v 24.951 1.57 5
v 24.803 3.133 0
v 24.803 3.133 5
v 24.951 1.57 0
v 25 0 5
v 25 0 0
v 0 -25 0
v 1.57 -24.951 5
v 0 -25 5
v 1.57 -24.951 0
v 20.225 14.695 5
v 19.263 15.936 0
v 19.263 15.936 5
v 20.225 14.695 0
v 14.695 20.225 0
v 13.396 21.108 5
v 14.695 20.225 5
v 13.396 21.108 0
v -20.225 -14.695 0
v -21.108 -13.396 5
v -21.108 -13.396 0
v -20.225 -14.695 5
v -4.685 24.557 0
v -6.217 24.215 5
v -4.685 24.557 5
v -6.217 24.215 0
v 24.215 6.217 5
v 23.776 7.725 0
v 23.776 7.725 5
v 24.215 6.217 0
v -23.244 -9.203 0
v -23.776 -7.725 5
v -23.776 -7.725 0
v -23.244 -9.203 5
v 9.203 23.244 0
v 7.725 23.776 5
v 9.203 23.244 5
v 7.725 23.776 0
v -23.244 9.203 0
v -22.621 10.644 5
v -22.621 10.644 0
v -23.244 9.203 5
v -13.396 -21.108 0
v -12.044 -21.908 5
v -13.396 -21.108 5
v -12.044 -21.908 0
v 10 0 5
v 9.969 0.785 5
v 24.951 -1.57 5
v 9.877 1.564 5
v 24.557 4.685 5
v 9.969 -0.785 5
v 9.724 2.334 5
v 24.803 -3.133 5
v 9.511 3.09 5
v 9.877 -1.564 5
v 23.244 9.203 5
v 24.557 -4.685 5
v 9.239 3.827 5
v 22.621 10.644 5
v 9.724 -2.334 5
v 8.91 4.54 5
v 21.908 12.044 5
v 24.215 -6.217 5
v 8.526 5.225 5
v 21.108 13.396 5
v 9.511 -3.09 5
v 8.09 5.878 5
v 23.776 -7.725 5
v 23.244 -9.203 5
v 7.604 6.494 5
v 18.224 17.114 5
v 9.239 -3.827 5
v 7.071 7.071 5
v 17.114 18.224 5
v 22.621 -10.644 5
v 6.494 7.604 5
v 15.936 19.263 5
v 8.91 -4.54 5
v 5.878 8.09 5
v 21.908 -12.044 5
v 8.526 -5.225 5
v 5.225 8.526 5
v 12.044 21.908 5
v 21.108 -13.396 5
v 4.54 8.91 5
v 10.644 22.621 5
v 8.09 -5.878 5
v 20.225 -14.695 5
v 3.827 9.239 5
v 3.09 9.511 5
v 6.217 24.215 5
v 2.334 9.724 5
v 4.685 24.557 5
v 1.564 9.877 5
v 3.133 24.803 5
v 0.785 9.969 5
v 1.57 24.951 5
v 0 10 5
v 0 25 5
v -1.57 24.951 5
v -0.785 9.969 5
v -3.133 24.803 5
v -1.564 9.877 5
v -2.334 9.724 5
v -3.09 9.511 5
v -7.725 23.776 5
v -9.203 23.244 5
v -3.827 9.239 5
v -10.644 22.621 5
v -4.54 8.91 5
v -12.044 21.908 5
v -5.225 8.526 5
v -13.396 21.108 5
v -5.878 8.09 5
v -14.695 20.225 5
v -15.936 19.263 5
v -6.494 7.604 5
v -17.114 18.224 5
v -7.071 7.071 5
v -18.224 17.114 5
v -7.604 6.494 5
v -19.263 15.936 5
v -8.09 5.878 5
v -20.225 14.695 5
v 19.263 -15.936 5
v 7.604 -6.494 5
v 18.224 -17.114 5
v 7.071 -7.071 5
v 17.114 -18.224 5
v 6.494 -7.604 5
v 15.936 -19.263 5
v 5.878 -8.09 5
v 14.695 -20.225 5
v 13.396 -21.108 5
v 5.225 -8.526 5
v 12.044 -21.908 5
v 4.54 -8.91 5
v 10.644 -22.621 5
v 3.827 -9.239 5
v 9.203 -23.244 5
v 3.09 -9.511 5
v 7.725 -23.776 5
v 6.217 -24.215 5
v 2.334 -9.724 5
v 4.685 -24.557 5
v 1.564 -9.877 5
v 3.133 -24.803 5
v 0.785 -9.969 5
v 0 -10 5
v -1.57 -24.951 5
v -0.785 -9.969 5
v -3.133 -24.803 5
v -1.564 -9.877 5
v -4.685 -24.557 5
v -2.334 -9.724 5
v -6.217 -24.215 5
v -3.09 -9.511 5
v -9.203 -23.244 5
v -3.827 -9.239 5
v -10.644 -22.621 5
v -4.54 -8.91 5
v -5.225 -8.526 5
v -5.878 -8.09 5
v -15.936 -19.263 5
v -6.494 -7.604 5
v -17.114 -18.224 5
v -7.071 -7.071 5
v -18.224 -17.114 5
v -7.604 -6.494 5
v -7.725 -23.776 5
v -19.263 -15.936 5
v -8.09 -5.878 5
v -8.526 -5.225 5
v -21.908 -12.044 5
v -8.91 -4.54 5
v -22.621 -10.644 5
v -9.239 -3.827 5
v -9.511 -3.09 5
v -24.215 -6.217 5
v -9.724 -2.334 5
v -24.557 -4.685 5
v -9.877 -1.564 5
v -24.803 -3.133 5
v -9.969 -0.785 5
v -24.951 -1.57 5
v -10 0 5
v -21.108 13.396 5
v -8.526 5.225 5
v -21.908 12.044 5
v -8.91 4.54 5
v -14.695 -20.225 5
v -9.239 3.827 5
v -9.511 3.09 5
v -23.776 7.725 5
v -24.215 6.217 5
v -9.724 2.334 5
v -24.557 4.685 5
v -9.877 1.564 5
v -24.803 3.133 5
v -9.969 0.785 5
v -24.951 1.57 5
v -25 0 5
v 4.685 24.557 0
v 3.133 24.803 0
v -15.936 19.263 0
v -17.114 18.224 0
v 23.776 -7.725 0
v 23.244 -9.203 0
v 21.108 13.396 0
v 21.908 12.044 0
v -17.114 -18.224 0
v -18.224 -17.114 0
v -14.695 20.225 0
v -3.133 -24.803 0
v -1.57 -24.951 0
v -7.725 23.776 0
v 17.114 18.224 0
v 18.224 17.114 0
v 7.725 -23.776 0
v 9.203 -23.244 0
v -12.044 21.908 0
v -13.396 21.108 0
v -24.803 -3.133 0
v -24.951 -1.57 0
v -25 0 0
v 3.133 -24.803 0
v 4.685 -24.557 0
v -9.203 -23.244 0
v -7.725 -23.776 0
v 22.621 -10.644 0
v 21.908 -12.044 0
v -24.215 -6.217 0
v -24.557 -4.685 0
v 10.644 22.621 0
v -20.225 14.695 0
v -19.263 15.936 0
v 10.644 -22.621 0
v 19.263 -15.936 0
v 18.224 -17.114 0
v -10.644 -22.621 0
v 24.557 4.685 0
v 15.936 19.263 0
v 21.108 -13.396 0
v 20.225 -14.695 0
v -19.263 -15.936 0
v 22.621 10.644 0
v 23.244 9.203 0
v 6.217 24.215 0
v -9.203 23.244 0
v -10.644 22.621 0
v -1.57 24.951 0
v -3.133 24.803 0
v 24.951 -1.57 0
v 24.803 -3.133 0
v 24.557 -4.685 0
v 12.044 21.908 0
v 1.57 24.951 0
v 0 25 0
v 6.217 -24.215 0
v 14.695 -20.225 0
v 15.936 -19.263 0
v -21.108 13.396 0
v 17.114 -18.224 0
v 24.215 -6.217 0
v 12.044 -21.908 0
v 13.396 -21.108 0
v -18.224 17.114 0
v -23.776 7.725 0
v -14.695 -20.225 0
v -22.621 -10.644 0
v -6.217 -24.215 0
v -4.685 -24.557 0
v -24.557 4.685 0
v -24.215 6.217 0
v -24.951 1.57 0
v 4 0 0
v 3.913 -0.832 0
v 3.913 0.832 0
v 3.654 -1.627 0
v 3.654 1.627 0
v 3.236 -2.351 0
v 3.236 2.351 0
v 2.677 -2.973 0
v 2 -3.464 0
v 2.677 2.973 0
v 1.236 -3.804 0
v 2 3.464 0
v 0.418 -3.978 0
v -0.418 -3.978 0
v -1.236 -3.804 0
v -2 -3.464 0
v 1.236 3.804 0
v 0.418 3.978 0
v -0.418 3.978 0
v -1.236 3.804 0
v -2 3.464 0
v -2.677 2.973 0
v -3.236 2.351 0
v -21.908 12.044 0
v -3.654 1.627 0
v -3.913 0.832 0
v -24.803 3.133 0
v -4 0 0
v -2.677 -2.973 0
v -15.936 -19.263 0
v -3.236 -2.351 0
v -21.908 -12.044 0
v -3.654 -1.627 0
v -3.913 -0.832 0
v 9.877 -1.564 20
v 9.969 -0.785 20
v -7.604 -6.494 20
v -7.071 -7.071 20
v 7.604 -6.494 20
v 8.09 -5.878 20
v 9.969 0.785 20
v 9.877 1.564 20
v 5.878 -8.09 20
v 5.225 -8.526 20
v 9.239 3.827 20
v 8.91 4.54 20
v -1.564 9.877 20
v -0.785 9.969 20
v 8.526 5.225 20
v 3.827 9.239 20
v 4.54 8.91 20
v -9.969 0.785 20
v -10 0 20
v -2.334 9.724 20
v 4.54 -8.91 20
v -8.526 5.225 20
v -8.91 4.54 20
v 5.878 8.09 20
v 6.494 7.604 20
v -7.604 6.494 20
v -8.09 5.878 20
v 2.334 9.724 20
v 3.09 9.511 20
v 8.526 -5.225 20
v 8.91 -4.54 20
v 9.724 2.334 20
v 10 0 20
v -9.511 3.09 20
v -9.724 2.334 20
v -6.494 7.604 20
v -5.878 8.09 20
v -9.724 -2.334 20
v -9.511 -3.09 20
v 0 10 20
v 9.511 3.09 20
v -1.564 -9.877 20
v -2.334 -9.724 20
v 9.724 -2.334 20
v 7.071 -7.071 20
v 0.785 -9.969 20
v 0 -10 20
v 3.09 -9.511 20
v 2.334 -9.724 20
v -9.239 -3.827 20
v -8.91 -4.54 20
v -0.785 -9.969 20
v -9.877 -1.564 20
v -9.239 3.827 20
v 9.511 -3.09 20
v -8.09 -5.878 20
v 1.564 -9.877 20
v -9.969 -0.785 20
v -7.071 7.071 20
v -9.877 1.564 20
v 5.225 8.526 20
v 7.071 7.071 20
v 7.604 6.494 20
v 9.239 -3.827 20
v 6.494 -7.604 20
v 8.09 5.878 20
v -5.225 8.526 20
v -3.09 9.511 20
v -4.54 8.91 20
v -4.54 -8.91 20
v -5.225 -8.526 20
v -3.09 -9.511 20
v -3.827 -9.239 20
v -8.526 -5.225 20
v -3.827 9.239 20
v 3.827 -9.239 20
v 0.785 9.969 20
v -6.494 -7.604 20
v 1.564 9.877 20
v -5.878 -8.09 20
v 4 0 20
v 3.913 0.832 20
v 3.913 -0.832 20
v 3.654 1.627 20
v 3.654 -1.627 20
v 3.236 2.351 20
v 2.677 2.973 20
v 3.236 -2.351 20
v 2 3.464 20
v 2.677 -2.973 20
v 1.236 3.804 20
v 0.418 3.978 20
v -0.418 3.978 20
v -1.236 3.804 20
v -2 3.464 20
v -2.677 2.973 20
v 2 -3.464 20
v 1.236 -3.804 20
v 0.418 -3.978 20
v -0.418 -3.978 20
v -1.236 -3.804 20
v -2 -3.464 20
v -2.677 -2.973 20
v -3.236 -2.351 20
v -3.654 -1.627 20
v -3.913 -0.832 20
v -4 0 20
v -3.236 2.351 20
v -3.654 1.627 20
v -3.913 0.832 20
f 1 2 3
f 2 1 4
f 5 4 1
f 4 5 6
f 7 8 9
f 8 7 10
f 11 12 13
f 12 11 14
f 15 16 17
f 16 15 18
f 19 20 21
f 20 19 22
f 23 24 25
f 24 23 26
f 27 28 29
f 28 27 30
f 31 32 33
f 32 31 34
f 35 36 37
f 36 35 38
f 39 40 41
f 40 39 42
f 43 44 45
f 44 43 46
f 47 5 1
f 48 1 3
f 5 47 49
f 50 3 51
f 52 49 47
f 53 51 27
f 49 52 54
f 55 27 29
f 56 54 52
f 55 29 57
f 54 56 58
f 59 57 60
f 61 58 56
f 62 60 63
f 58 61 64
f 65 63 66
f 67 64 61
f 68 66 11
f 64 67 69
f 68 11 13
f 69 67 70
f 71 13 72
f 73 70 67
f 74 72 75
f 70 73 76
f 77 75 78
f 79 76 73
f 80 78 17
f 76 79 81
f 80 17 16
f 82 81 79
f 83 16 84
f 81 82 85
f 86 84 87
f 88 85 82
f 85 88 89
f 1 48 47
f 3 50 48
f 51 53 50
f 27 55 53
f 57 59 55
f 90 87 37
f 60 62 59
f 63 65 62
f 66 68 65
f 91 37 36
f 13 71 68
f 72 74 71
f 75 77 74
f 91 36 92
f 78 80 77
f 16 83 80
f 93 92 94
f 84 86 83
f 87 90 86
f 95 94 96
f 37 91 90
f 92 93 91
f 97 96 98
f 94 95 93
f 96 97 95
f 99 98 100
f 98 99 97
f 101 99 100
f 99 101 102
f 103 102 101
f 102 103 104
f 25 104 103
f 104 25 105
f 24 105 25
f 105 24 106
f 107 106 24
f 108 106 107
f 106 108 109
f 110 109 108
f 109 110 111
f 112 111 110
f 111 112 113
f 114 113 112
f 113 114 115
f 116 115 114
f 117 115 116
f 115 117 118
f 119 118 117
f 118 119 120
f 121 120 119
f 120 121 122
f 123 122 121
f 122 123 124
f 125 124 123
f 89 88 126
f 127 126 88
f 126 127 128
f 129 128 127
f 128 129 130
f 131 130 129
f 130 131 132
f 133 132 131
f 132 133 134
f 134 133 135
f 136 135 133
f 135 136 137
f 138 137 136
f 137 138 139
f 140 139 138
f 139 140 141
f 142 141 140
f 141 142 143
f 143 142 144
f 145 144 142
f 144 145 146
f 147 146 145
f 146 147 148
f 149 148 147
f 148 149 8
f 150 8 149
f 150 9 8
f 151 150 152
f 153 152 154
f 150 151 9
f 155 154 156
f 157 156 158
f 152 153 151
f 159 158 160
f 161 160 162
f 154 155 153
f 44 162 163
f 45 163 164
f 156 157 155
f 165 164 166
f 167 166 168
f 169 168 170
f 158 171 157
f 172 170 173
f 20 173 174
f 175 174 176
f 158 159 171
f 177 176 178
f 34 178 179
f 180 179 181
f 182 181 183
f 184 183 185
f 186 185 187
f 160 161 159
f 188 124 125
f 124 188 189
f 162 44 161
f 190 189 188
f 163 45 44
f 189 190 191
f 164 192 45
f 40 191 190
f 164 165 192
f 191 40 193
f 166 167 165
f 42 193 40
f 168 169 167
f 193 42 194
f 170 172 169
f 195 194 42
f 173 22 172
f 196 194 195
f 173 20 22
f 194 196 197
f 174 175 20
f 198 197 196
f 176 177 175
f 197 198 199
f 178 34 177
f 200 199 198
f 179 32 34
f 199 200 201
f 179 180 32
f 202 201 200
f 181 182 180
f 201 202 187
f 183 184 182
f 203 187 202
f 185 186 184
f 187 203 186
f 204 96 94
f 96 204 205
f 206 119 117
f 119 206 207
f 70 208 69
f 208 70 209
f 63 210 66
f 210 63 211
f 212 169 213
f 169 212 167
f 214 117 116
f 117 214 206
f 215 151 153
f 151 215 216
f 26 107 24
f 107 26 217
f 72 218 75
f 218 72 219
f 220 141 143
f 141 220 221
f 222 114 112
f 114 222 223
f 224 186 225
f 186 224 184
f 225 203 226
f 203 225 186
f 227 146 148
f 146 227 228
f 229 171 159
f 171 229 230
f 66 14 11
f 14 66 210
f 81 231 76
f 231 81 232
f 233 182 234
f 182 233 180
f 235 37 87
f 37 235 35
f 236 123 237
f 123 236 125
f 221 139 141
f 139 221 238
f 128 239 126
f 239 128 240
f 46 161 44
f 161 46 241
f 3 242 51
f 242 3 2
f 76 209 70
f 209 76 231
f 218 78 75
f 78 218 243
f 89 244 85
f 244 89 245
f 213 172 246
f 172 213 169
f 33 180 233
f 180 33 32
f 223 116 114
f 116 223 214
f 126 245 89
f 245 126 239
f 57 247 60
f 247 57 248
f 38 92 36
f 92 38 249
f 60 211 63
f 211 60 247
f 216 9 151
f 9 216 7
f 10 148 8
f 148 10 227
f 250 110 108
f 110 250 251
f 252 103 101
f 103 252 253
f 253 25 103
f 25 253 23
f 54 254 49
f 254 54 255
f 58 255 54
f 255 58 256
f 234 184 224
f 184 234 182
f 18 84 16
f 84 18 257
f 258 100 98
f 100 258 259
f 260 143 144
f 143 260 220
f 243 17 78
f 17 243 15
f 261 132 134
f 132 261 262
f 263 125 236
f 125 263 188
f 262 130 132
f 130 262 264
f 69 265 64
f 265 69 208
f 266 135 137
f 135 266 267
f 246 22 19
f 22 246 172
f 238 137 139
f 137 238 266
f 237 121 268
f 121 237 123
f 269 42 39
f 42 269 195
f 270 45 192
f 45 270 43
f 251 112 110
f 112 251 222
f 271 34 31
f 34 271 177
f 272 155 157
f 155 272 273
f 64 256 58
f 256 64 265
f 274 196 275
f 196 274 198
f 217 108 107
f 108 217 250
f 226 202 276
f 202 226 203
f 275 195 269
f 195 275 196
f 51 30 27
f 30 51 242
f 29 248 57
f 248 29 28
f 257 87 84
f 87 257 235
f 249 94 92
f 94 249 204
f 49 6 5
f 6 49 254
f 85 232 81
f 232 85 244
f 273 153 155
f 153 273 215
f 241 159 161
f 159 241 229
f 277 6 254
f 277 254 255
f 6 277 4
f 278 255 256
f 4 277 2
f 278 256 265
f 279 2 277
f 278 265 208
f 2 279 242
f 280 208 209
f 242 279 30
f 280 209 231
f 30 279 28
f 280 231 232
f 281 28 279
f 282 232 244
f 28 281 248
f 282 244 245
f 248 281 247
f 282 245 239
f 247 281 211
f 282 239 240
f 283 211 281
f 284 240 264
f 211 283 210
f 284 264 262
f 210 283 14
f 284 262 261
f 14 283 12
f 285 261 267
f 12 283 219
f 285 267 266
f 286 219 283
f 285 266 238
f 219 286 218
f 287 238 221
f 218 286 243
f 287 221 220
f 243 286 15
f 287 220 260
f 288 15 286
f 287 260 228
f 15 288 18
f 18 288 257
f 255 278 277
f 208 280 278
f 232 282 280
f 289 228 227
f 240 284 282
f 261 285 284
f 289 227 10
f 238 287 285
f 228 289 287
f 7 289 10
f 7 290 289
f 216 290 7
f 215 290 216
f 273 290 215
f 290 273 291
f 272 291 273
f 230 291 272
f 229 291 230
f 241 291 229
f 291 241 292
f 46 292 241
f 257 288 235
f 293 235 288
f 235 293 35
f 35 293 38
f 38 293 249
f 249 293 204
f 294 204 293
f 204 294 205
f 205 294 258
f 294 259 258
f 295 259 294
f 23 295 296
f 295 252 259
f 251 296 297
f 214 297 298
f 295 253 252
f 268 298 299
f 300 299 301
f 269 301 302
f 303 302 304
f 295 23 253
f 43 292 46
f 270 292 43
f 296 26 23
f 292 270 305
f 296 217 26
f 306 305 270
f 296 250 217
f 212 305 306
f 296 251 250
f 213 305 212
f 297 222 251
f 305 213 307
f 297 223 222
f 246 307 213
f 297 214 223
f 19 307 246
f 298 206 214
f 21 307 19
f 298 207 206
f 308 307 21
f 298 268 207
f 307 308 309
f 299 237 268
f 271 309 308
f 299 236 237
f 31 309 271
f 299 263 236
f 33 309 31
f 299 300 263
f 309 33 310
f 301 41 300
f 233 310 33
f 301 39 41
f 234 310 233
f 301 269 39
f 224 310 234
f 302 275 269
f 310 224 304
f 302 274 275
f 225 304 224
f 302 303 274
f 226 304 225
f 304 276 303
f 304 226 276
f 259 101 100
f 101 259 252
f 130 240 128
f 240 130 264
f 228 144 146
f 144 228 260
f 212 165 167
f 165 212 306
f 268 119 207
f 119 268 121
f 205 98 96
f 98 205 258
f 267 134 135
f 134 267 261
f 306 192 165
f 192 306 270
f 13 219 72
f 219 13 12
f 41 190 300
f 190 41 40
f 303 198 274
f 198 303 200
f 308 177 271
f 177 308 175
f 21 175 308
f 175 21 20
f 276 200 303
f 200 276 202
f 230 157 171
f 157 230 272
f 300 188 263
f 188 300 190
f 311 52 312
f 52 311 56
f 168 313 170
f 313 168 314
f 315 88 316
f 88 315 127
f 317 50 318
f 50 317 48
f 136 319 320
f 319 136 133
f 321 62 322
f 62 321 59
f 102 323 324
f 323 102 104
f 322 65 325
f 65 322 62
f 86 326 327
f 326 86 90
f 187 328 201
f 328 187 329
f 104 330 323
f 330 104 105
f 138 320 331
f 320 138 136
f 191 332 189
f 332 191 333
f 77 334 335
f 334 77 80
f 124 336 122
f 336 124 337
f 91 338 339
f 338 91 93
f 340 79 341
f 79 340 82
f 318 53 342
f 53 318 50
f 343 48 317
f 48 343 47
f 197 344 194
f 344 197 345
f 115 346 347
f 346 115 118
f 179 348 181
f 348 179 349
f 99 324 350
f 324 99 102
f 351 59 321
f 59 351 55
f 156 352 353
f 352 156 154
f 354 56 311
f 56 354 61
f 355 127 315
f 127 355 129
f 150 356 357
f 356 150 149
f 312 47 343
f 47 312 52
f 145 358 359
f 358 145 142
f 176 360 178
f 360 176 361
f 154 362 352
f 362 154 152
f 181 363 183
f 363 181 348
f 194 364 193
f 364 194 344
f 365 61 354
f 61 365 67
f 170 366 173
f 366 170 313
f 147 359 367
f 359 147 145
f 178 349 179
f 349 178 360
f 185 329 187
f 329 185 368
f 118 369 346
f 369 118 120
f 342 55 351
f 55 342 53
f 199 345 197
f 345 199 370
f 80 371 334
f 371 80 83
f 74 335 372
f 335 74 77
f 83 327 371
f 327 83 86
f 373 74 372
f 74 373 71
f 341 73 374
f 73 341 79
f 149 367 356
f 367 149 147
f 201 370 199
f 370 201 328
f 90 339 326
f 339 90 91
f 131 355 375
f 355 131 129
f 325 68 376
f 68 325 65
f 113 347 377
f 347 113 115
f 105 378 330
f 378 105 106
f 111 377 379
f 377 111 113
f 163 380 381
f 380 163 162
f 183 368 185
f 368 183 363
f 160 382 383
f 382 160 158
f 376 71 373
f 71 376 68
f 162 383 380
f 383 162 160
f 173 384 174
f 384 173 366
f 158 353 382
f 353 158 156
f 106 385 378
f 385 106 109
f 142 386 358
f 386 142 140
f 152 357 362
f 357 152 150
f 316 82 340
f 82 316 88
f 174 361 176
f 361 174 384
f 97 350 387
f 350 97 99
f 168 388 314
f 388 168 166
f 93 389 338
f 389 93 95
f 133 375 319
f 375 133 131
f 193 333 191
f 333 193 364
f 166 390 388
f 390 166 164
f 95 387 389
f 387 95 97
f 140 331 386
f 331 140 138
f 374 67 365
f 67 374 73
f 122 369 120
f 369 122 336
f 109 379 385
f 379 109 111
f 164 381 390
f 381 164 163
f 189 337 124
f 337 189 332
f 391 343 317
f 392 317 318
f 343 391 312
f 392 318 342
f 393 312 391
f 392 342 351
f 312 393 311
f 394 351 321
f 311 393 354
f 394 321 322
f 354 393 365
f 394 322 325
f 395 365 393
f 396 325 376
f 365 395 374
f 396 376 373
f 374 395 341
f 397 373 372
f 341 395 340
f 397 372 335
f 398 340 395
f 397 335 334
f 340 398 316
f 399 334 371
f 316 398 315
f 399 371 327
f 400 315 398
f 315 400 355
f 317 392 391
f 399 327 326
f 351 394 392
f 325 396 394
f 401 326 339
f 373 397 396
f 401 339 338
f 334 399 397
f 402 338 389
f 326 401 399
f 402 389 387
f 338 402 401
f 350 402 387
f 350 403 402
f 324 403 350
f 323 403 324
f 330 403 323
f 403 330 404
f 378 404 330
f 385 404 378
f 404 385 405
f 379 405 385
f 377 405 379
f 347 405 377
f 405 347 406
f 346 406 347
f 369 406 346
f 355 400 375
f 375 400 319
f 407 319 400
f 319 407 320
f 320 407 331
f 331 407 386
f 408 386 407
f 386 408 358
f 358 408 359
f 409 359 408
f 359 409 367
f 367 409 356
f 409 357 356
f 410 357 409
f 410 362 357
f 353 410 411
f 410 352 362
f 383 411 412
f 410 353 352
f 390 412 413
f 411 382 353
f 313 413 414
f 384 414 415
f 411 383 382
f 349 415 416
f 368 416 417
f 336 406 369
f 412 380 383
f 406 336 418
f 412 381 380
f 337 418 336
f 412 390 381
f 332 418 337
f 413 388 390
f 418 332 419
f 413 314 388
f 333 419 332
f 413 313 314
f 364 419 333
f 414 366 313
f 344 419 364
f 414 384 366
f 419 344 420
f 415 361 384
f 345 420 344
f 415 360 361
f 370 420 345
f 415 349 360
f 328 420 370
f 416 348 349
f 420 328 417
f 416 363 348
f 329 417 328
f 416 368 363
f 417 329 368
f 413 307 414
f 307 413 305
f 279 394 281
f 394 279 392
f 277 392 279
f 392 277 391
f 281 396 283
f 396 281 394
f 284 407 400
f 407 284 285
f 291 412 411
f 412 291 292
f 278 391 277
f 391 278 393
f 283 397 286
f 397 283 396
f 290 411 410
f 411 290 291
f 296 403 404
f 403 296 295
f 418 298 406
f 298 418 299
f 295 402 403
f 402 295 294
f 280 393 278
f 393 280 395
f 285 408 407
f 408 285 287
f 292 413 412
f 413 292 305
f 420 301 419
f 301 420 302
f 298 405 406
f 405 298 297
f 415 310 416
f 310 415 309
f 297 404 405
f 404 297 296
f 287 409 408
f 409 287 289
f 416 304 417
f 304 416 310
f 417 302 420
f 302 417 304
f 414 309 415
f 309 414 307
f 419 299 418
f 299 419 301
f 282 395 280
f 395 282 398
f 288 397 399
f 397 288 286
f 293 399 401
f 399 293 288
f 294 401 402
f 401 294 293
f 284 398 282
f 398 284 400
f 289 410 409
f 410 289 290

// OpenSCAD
// file: utils/build_plate.scad
// Build Plate representation module
// Made by Makerbot (http://curriculum.makerbot.com/daily_lessons/february/openscad_buildplate.html)

//use this to include a build plate visualization in your openSCAD scripts. Very useful for things designed to be edited in Makerbot Customizer

//to use, either include or use <utils/build_plate.scad>

//then just call build_plate(); with the following arguments (also, you have to have a real object in your scene for this to render)

//putting 0 as the first argument will give you a Replicator 2 build plate
//putting 1 as the first argument will give you a Replicator 1 build plate
//putting 2 as the first argument will give you a Thingomatic build plate
//putting 3 as the first argument will give you a manually adjustable build plate (note: if you use this option, you need to specify your build plates X length (in mm) as the second argument and the Y length (in mm) as the third argument. eg. build_plate(3,150,120);)

/*

to give your user control of which build plate they see in Customizer, include the following code:

use <utils/build_plate.scad>

//for display only, doesn't contribute to final object
build_plate_selector = 0; //[0:Replicator 2,1: Replicator,2:Thingomatic,3:Manual]
//when Build Plate Selector is set to "manual" this controls the build plate x dimension
build_plate_manual_x = 100; //[100:400]
//when Build Plate Selector is set to "manual" this controls the build plate y dimension
build_plate_manual_y = 100; //[100:400]

build_plate(build_plate_selector,build_plate_manual_x,build_plate_manual_y);

*/




//to see how this works, uncomment the following code

//build_plate_selector = 0; //[0:Replicator 2,1: Replicator,2:Thingomatic,3:Manual]
//build_plate_manual_x = 100; //[100:400]
//build_plate_manual_y = 100; //[100:400]
//
//build_plate(build_plate_selector,build_plate_manual_x,build_plate_manual_y);
//
//cube(5);


module build_plate(bp,manX,manY){

		translate([0,0,-.52]){
			if(bp == 0){
				%cube([285,153,1],center = true);
			}
			if(bp == 1){
				%cube([225,145,1],center = true);
			}
			if(bp == 2){
				%cube([120,120,1],center = true);
			}
			if(bp == 3){
				%cube([manX,manY,1],center = true);
			}
		
		}
		translate([0,0,-.5]){
			if(bp == 0){
				for(i = [-14:14]){
					translate([i*10,0,0])
					%cube([.5,153,1.01],center = true);
				}
				for(i = [-7:7]){
					translate([0,i*10,0])
					%cube([285,.5,1.01],center = true);
				}	
			}
			if(bp == 1){
				for(i = [-11:11]){
					translate([i*10,0,0])
						%cube([.5,145,1.01],center = true);
				}
				for(i = [-7:7]){
					translate([0,i*10,0])
						%cube([225,.5,1.01],center = true);
				}
			}
			if(bp == 2){
				for(i = [-6:6]){
					translate([i*10,0,0])
						%cube([.5,120,1.01],center = true);
				}
				for(i = [-6:6]){
					translate([0,i*10,0])
						%cube([120,.5,1.01],center = true);
				}
			}
			if(bp == 3){
				for(i = [-(floor(manX/20)):floor(manX/20)]){
					translate([i*10,0,0])
						%cube([.5,manY,1.01],center = true);
				}
				for(i = [-(floor(manY/20)):floor(manY/20)]){
					translate([0,i*10,0])
						%cube([manX,.5,1.01],center = true);
				}
			}
		}
}
// main file
use <./utils/build_plate.scad> // Cuadricula transparente para la base
build_plate(3, 200,100); // No se incluye al renderizar


//----------------------------------------------------------
//-- Tutorial OpenScad
//-- Juan Gonzalez-Gomez (Obijuan) juan@iearobotics.com
//----------------------------------------------------------
//-- (c) Mayo, 2012
//-- Licencia GPL
//----------------------------------------------------------
//-- Ejemplo de cómo pegar piezas
//----------------------------------------------------------

//-- Rueda con portaejes y taladro para el eje
difference() {
  //-- Rueda
  union() {
    //-- Base de la rueda
    cylinder(r=50/2, h=5, $fn=100);
    //-- Portaejes
    cylinder(r=20/2, h=20, $fn=80);
  }
  //-- Taladro
  cylinder(r=8/2, h=80, $fn=30,center=true);
}
